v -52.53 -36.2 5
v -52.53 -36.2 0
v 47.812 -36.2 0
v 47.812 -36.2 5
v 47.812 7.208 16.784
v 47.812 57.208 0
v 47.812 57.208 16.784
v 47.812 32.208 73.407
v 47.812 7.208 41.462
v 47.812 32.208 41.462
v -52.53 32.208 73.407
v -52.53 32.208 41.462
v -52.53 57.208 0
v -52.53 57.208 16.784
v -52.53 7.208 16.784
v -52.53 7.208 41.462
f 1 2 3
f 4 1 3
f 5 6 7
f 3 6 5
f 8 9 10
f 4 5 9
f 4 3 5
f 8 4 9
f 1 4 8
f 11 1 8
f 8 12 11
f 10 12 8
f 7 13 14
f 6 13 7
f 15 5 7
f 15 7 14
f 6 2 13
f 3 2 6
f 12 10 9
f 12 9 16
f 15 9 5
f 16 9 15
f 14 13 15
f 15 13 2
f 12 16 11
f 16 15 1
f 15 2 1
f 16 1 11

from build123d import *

# Parameters (mm, degrees)
F0_W        = 100.3427430987
F0_H        = 68.4072636068
F1_DEPTH    = 75
F2_T1_DEPTH = 460.378361414
F3_W        = 100.3427430987
F3_H        = 24.6774237603
F4_DEPTH    = 25
F5_DEPTH    = 25


# Not quite as in the source:
# - a fillet or chamfer that OpenCascade refuses, or shapes differently, is made with other operations: its cross-section is extruded or revolved along the edge and cut away or added


with BuildPart() as f1:
    # F0 (on Top) → F1 (new body)
    with BuildSketch(Plane.XY):
        with Locations((-2.3588724434, -1.9959677011)):
            Rectangle(F0_W, F0_H)
    extrude(amount=F1_DEPTH)

    # F2: chamfer of 70 on 1 edges, made by hand

    # F2_s2 → F2_t1 (cut)
    with BuildSketch(Plane.YZ.offset(-232.5480531504)):
        Polygon((-36.1995995045, 5), (33.8004004955, 75), (-36.1995995045, 75), align=None)
    extrude(amount=F2_T1_DEPTH, mode=Mode.SUBTRACT)

    # F3 (on face) → F4 (cut)
    with BuildSketch(Plane(origin=(0, 32.2076641023, 0), x_dir=(-1, 0, 0), z_dir=(0, 1, 0))):
        with Locations((2.3588724434, 29.1229868308)):
            Rectangle(F3_W, F3_H)
    extrude(amount=-F4_DEPTH, mode=Mode.SUBTRACT)

    # F5 (add): a face of the model
    f5_faces = [f1.faces().sort_by_distance(p)[0] for p in [
        (-2.3588724434, 32.2076641023, 8.3921374753),
    ]]
    extrude(f5_faces, amount=F5_DEPTH)


solid = f1.part
